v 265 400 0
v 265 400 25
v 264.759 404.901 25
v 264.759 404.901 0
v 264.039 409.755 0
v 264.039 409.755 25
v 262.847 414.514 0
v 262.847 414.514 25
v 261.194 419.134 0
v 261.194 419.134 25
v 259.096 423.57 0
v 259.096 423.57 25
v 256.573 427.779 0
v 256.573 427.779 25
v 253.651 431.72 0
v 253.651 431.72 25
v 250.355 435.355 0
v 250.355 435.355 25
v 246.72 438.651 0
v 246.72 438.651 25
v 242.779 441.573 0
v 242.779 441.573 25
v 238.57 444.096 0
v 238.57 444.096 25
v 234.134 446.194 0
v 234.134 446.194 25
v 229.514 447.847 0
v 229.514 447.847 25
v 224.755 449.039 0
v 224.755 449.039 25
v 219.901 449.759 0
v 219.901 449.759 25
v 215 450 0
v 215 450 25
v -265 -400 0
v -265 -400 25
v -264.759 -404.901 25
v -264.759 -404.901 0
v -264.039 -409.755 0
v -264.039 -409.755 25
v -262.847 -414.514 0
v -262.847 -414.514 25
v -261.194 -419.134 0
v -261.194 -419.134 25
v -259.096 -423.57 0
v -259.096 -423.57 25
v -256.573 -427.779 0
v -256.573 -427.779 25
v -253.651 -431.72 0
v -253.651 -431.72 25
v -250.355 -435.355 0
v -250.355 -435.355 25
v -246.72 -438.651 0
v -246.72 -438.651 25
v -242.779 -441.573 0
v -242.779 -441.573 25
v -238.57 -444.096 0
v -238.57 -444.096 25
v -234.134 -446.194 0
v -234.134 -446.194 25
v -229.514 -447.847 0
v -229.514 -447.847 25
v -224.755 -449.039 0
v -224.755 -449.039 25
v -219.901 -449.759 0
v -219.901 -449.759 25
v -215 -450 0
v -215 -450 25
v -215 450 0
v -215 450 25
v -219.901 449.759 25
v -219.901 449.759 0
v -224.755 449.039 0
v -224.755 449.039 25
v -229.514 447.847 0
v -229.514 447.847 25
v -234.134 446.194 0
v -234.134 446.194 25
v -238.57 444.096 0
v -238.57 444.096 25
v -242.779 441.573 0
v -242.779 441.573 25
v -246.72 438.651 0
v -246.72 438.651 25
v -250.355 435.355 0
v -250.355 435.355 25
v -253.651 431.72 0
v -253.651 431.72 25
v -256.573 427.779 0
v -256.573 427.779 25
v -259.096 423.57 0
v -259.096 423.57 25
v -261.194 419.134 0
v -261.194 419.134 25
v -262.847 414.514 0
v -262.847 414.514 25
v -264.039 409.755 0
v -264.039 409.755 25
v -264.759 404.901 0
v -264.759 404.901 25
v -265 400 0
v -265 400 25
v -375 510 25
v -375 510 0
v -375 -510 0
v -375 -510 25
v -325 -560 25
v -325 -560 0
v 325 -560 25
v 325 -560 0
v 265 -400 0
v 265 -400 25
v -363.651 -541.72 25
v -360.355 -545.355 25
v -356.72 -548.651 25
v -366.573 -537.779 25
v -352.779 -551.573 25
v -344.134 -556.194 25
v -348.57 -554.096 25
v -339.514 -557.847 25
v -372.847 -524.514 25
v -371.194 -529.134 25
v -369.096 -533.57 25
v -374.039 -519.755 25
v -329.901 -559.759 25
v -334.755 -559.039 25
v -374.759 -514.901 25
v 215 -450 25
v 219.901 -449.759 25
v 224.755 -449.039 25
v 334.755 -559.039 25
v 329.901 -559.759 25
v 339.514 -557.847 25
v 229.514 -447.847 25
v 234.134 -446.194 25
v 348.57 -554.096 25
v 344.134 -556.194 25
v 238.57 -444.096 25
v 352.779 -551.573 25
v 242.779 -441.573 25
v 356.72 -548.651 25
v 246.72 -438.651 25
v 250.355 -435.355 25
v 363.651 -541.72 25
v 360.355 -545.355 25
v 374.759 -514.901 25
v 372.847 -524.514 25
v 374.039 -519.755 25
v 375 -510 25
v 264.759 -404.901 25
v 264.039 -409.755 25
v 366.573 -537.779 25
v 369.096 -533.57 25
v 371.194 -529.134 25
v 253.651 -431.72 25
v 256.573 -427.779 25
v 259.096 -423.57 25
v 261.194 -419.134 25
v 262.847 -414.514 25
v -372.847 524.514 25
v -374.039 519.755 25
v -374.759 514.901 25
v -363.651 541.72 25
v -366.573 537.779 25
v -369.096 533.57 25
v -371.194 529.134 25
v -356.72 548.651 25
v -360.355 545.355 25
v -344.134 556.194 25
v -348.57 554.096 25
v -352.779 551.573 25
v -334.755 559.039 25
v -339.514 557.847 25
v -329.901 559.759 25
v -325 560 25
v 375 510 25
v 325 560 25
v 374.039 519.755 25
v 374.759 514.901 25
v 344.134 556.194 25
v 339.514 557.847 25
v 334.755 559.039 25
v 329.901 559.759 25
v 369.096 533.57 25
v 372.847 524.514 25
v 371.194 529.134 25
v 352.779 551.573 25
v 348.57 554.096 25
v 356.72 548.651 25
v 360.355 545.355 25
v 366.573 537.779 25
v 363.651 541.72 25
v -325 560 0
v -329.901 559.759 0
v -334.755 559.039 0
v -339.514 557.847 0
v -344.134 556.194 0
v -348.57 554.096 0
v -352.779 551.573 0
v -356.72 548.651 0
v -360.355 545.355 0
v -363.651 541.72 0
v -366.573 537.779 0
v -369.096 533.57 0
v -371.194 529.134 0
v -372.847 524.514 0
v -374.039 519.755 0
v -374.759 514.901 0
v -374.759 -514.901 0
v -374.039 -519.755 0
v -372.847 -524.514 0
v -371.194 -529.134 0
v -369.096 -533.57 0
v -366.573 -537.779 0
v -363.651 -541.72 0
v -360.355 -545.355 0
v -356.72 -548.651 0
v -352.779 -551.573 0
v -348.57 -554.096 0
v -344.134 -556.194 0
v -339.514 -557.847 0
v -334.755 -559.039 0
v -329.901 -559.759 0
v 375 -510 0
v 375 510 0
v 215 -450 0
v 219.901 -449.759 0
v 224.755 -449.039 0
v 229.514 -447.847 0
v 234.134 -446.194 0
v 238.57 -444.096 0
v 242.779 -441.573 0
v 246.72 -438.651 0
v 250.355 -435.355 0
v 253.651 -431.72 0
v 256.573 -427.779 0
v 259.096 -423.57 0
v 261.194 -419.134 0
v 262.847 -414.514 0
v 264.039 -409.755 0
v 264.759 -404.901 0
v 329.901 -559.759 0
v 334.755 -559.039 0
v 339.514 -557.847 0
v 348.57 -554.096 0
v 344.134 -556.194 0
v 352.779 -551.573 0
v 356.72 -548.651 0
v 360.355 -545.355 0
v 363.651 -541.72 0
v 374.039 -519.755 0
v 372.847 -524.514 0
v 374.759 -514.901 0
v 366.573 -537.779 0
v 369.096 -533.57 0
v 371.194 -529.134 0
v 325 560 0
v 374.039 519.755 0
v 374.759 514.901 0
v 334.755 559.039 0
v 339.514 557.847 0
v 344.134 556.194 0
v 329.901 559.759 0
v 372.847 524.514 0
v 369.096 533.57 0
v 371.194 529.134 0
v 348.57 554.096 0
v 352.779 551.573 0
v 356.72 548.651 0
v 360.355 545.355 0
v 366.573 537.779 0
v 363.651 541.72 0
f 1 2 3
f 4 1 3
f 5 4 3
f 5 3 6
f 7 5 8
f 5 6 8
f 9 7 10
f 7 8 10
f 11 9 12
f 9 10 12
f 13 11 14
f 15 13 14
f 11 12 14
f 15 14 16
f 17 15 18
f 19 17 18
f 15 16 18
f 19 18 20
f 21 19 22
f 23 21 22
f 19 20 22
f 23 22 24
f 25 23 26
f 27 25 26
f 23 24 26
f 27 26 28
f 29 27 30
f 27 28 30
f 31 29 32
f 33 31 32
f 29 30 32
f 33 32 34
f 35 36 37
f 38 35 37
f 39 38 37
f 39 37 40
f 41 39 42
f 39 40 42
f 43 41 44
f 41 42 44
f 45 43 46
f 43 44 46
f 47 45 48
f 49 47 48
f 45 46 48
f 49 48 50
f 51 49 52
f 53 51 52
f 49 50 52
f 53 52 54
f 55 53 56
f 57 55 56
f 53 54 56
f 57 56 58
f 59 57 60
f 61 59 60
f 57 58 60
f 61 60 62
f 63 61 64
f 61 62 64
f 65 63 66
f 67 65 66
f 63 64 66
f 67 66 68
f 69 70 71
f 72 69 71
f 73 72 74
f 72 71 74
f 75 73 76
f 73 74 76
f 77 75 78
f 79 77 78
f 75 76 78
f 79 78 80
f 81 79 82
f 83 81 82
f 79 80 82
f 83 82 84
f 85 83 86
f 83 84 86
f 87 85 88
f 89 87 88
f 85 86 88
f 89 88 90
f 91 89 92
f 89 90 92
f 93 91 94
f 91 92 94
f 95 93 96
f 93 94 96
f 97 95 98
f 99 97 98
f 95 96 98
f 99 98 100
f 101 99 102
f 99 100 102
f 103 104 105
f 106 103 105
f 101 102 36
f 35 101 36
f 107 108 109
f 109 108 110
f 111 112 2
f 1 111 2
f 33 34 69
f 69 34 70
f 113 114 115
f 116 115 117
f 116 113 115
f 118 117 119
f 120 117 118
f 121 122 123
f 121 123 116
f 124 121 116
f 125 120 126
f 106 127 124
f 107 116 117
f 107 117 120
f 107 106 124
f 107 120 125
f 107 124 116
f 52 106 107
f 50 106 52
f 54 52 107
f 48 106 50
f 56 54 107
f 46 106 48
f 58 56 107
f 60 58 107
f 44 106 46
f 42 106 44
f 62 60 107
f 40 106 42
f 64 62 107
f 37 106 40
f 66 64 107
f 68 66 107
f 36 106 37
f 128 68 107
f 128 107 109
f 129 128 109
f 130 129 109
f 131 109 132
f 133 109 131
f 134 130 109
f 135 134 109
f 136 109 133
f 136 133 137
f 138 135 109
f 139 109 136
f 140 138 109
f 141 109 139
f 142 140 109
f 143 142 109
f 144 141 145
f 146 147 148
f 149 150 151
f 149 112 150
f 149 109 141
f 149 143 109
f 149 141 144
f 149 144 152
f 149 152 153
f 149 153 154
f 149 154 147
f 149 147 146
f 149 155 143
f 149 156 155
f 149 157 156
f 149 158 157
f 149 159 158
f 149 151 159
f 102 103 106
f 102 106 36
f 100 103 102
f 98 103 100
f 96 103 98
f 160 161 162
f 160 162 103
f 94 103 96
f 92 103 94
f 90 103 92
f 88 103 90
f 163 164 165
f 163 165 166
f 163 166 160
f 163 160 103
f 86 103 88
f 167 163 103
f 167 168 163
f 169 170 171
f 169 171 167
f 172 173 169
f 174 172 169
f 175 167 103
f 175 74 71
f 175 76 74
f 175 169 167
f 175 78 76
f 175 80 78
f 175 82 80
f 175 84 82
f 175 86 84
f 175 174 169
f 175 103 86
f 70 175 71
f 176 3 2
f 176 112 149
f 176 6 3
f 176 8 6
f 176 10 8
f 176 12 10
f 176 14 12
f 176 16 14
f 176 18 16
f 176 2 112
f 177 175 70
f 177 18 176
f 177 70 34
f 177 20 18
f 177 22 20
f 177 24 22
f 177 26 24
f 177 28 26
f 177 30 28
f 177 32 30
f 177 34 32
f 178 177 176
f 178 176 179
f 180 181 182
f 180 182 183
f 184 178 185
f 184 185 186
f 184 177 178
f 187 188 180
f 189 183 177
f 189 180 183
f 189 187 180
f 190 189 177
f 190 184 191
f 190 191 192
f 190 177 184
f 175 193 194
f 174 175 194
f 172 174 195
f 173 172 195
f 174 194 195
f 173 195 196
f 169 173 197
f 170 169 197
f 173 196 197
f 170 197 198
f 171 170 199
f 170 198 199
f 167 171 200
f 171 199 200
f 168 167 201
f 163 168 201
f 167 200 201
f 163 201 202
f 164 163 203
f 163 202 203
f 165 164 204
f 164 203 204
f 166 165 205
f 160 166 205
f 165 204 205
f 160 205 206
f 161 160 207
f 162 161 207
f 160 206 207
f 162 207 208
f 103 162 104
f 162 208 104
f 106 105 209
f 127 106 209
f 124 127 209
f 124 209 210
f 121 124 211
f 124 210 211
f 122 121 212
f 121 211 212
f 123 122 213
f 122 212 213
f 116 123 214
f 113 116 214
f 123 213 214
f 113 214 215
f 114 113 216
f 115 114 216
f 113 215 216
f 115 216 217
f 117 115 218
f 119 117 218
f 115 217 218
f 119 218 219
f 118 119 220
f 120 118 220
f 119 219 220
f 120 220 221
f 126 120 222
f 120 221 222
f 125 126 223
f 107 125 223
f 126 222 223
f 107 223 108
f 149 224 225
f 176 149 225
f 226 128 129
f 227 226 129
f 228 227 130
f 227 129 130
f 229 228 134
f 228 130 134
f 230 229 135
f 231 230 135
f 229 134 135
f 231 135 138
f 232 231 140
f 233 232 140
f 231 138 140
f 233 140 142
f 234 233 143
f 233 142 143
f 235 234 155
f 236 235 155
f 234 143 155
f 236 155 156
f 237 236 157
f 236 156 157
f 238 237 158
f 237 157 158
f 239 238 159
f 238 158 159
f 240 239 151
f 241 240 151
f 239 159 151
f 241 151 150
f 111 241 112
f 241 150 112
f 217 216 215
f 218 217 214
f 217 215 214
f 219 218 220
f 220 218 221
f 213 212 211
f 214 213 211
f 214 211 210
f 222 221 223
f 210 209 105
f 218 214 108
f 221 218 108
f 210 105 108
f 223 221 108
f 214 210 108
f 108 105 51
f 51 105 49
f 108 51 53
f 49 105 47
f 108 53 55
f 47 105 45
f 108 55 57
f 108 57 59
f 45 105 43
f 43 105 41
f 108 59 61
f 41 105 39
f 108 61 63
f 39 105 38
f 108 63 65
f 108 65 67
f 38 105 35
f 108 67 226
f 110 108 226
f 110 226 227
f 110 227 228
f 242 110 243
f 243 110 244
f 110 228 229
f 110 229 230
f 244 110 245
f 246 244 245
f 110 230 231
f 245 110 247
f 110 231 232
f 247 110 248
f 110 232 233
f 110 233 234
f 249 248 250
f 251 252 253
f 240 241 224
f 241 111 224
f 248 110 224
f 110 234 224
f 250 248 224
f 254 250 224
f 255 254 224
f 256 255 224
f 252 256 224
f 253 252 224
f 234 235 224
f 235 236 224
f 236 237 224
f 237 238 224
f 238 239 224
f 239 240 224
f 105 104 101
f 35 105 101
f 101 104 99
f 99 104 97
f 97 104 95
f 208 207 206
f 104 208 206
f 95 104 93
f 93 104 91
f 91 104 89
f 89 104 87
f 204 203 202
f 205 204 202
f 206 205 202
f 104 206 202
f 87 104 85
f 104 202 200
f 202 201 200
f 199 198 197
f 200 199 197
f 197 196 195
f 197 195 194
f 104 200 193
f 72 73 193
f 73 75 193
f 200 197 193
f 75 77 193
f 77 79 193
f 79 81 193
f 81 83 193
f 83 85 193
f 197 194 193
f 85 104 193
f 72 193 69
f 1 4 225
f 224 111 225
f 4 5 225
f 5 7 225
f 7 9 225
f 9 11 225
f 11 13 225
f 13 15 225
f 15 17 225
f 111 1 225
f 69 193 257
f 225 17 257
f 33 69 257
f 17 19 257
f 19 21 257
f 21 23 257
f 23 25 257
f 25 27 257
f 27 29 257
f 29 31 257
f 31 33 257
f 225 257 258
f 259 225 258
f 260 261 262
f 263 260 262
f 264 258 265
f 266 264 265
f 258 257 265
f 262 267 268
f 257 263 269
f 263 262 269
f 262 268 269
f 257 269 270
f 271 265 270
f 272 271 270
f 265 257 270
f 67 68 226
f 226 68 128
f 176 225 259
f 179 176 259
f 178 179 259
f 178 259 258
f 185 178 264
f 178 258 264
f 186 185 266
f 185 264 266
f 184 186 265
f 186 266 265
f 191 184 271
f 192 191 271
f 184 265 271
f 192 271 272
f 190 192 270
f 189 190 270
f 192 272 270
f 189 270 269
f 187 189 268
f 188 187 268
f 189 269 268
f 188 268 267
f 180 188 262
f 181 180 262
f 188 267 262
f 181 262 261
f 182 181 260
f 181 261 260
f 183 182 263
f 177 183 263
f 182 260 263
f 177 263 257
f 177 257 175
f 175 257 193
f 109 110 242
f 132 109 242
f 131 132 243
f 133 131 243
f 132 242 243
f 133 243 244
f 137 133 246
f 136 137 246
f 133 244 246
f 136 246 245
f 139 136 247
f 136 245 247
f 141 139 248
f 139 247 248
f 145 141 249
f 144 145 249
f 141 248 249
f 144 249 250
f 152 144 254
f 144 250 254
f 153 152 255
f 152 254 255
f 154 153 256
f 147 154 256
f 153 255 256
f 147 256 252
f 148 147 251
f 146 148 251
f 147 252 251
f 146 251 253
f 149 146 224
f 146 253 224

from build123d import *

# Parameters (mm, degrees)
F1_DEPTH = 25
F3_DEPTH = 25


with BuildPart() as f1:
    # F0 (on Top) → F1 (new body)
    with BuildSketch(Plane.XY):
        with BuildLine():
            Line((325, 560), (-325, 560))
            ThreePointArc((-325, 560), (-360.355339, 545.355339), (-375, 510))
            Line((-375, 510), (-375, -510))
            ThreePointArc((-375, -510), (-360.355339, -545.355339), (-325, -560))
            Line((-325, -560), (325, -560))
            ThreePointArc((325, -560), (360.355339, -545.355339), (375, -510))
            Line((375, -510), (375, 510))
            ThreePointArc((375, 510), (360.355339, 545.355339), (325, 560))
        make_face()
    extrude(amount=F1_DEPTH)

    # F2 (on face) → F3 (cut)
    with BuildSketch(Plane.XY.offset(25)):
        with BuildLine():
            Line((215, 450), (-215, 450))
            ThreePointArc((-215, 450), (-250.355339, 435.355339), (-265, 400))
            Line((-265, 400), (-265, -400))
            ThreePointArc((-265, -400), (-250.355339, -435.355339), (-215, -450))
            Line((-215, -450), (215, -450))
            ThreePointArc((215, -450), (250.355339, -435.355339), (265, -400))
            Line((265, -400), (265, 400))
            ThreePointArc((265, 400), (250.355339, 435.355339), (215, 450))
        make_face()
    extrude(amount=-F3_DEPTH, mode=Mode.SUBTRACT)


solid = f1.part
